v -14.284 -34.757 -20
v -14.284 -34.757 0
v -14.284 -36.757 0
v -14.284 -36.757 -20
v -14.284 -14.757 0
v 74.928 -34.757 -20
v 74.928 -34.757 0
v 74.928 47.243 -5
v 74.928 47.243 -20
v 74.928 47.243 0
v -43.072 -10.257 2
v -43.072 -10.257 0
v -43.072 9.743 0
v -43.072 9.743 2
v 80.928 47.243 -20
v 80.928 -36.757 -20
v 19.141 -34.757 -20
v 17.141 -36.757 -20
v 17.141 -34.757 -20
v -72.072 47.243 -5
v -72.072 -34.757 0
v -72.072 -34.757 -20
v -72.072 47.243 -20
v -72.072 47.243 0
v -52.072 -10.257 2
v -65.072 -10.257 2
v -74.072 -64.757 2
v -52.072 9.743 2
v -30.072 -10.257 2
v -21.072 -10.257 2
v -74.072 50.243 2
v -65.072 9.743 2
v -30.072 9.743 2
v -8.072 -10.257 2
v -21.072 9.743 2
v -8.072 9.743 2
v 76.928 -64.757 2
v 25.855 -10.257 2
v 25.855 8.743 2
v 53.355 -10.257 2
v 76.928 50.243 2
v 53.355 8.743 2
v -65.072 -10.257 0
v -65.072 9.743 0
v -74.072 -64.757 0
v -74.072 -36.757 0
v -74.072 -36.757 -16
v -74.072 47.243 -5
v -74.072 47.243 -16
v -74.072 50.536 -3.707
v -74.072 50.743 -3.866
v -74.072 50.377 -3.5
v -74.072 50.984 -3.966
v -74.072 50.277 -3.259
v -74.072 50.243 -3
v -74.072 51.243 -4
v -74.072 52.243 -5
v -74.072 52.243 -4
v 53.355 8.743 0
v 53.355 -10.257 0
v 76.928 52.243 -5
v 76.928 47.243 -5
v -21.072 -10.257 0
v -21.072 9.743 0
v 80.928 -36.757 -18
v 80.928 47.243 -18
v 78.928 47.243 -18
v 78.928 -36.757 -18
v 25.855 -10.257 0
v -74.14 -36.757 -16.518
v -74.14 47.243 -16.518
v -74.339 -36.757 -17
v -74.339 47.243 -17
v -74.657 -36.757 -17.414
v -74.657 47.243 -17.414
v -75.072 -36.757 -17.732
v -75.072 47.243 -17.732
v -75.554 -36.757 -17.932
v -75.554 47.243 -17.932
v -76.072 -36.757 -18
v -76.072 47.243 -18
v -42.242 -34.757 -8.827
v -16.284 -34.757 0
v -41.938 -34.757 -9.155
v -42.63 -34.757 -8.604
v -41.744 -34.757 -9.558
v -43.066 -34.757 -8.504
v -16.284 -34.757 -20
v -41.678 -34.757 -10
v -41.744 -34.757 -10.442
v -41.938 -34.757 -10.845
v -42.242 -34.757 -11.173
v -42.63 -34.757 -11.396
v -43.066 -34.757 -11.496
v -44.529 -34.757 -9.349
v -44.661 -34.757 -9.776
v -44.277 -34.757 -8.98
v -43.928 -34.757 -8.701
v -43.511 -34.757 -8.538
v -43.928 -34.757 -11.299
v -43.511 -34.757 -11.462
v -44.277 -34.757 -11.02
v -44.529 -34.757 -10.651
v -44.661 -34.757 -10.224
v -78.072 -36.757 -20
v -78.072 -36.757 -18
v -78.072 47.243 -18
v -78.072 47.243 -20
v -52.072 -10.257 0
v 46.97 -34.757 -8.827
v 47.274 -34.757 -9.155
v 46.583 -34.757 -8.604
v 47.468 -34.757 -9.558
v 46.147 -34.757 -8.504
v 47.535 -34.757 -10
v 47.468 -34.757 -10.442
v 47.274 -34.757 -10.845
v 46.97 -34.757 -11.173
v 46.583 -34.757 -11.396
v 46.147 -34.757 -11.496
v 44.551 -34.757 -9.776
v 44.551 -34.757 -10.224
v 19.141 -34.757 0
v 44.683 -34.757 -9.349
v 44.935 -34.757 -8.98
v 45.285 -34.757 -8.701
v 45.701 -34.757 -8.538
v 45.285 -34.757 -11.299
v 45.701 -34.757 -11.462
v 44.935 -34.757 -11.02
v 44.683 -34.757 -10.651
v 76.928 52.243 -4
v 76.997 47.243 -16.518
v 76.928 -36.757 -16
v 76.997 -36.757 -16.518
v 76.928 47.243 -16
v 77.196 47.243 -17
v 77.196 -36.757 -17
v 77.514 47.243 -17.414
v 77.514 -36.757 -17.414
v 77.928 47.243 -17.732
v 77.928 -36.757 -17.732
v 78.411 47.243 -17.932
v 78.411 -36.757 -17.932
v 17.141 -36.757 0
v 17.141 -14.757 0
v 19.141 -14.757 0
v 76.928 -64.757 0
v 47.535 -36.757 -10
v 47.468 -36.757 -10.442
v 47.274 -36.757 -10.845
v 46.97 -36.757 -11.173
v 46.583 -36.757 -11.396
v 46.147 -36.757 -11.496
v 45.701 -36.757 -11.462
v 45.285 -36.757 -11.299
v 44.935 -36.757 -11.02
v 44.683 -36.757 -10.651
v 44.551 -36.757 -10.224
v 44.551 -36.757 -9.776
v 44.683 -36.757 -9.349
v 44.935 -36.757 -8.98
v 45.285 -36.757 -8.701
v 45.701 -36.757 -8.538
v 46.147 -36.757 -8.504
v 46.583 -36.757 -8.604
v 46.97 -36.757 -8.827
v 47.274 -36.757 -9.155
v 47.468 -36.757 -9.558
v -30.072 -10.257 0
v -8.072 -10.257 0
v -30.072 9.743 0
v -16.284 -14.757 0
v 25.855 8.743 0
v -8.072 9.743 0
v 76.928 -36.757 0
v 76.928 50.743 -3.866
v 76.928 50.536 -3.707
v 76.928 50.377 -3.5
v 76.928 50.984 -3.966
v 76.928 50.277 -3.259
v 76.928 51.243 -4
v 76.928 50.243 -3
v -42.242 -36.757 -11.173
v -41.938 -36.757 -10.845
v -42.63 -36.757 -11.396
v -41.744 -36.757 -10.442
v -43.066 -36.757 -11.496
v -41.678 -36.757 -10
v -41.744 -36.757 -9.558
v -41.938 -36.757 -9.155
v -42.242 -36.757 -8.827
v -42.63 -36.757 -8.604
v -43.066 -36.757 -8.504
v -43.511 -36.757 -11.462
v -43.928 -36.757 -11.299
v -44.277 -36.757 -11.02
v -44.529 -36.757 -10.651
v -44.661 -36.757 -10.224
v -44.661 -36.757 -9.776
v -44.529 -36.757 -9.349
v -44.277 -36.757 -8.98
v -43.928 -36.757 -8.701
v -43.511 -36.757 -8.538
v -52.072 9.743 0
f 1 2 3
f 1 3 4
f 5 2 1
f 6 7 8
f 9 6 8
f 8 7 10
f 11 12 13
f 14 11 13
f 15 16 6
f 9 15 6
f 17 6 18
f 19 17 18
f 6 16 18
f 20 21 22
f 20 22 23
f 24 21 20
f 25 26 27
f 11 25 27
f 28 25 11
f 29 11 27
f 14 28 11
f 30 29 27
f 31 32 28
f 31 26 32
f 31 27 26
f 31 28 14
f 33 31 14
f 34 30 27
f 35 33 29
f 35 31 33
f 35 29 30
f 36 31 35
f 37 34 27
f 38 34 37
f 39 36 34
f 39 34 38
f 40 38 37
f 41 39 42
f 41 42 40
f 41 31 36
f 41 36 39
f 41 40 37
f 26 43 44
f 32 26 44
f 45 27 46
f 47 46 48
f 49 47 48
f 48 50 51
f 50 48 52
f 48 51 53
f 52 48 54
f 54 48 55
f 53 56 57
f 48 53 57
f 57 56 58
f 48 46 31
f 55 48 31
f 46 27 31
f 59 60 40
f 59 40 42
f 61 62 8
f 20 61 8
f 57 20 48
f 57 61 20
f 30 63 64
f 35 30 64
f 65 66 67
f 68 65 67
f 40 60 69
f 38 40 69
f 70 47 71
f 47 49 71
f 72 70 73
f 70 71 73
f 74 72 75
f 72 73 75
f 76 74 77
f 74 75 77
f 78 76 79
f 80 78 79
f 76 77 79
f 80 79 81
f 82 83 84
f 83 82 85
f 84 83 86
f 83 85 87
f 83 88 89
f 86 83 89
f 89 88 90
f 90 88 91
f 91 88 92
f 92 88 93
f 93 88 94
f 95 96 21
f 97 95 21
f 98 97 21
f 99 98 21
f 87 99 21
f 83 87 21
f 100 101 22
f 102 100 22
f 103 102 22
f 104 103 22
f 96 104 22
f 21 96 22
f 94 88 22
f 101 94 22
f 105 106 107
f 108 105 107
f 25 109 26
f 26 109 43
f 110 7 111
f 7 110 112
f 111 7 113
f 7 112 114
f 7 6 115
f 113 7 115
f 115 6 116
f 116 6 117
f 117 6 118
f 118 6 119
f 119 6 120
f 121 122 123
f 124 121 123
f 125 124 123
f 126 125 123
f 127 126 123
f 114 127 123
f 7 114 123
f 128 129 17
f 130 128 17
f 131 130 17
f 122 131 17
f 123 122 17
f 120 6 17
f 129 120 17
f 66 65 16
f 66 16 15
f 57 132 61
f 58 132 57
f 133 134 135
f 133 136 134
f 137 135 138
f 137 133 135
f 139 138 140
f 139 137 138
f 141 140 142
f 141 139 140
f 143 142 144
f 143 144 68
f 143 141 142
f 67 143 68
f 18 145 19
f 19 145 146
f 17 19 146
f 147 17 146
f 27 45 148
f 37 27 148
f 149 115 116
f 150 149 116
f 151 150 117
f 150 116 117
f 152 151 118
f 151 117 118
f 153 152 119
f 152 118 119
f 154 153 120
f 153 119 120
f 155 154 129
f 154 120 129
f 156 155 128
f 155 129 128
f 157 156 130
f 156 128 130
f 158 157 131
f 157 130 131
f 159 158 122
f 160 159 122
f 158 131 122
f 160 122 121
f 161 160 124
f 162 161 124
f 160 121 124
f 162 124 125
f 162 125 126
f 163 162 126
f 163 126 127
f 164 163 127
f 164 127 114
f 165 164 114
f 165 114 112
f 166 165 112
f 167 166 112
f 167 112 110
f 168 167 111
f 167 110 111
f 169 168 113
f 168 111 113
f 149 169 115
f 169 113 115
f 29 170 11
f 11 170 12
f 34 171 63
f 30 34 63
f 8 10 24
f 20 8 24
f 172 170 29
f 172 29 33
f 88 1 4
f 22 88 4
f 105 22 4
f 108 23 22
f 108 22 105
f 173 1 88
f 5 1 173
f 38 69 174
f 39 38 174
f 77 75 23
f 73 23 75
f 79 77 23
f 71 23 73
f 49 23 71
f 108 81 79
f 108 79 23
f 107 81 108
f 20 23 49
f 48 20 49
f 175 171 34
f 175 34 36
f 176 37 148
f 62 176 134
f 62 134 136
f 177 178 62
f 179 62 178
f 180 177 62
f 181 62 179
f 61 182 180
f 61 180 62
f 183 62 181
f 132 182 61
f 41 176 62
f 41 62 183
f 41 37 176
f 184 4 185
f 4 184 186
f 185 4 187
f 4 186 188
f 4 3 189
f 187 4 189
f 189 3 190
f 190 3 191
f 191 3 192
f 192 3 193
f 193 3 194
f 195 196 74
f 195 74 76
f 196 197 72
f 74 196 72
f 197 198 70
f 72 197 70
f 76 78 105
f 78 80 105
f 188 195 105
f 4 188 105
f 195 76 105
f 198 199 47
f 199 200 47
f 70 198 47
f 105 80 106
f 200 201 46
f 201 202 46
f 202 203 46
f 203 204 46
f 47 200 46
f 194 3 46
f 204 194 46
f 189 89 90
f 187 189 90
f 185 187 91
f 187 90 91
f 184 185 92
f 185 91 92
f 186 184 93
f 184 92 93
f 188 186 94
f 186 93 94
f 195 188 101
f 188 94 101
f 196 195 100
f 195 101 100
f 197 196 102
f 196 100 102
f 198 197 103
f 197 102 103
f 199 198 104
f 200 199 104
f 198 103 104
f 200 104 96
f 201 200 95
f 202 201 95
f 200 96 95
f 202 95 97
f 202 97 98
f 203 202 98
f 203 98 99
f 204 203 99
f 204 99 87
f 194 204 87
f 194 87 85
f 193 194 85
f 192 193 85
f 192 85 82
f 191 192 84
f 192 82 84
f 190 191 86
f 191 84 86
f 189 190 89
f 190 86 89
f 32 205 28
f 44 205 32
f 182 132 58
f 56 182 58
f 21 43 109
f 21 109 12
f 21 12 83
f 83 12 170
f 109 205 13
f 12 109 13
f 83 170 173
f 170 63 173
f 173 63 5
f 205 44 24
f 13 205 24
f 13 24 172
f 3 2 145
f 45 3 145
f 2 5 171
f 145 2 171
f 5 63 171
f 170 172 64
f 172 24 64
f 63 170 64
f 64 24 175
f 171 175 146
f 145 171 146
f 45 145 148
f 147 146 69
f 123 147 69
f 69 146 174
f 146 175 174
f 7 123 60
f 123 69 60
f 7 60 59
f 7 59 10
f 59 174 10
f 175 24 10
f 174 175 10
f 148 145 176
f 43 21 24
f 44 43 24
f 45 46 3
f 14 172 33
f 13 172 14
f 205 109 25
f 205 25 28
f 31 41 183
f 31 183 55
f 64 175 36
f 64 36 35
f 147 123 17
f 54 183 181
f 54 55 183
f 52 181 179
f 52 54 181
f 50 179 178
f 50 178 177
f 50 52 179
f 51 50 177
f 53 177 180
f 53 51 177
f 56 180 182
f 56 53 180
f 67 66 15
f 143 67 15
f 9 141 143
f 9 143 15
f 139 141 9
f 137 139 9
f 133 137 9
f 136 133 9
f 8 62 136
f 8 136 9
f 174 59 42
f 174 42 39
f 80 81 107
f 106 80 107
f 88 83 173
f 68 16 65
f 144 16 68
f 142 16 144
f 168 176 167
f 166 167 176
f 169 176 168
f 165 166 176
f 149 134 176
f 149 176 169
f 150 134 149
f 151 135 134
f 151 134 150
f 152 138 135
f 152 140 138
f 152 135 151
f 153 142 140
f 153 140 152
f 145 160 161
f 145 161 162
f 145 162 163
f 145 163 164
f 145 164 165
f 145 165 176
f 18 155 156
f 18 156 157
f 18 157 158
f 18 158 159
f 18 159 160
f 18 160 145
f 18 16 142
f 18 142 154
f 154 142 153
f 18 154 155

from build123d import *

# Parameters (mm, degrees)
SKETCH1_W            = 151
SKETCH1_H            = 115
BOSS_EXTRUDE1_DEPTH  = 2
SKETCH2_W            = 13
SKETCH2_H            = 20
CUT_EXTRUDE1_DEPTH   = 2
SKETCH3_W            = 27.5
SKETCH3_H            = 19
CUT_EXTRUDE2_DEPTH   = 2
SKETCH4_W            = 151
SKETCH4_H            = 3
BOSS_EXTRUDE2_DEPTH  = 4
SKETCH6_W            = 151
SKETCH6_H            = 5
BOSS_EXTRUDE3_DEPTH  = 1
FILLET1_R            = 1
SKETCH7_W            = 2
SKETCH7_H            = 84
BOSS_EXTRUDE4_DEPTH  = 10
SKETCH8_W            = 27.5
SKETCH8_H            = 19
SKETCH8_W_2          = 13
SKETCH8_H_2          = 20
CUT_EXTRUDE3_DEPTH   = 10
SKETCH9_W            = 126.512620881
SKETCH9_H            = 26.913833817
BOSS_EXTRUDE5_DEPTH  = 2
SKETCH10_W           = 2
SKETCH10_H           = 84
BOSS_EXTRUDE6_DEPTH  = 8
SKETCH12_W           = 6
SKETCH12_H           = 84
BOSS_EXTRUDE7_DEPTH  = 2
FILLET2_R            = 2
FILLET3_R            = 2
SKETCH14_W           = 57.787784132
SKETCH14_H           = 20
SKETCH14_W_2         = 59.787784131
BOSS_EXTRUDE8_DEPTH  = 2
SKETCH15_R           = 1.5
CUT_EXTRUDE4_DEPTH   = 2
BOSS_EXTRUDE9_DEPTH  = 2
BOSS_EXTRUDE10_DEPTH = 2


with BuildPart() as part:
    # Sketch1 → Boss-Extrude1 (new body)
    with BuildSketch(Plane.XY):
        with Locations((1.428458571, -7.256892256)):
            Rectangle(SKETCH1_W, SKETCH1_H)
    extrude(amount=BOSS_EXTRUDE1_DEPTH)

    # Sketch2 → Cut-Extrude1 (cut)
    with BuildSketch(Plane.XY.offset(2)):
        with Locations((-58.571541429, -29.756892256)):
            Rectangle(SKETCH2_W, SKETCH2_H)
        with Locations((-36.571541429, -29.756892256)):
            Rectangle(SKETCH2_W, SKETCH2_H)
        with Locations((-14.571541429, -29.756892256)):
            Rectangle(SKETCH2_W, SKETCH2_H)
    extrude(amount=-CUT_EXTRUDE1_DEPTH, mode=Mode.SUBTRACT)

    # Sketch3 → Cut-Extrude2 (cut)
    with BuildSketch(Plane.XY.offset(2)):
        with Locations((39.228458571, -29.756892256)):
            Rectangle(SKETCH3_W, SKETCH3_H)
    extrude(amount=-CUT_EXTRUDE2_DEPTH, mode=Mode.SUBTRACT)

    # Sketch4 → Boss-Extrude2 (add)
    with BuildSketch(Plane(origin=(0, 0, 0), x_dir=(-1, 0, 0), z_dir=(0, 0, -1))):
        with Locations((-1.428458571, 48.743107744)):
            Rectangle(SKETCH4_W, SKETCH4_H)
    extrude(amount=BOSS_EXTRUDE2_DEPTH)

    # Sketch6 → Boss-Extrude3 (add)
    with BuildSketch(Plane(origin=(0, 0, -4), x_dir=(-1, 0, 0), z_dir=(0, 0, -1))):
        with Locations((-1.428458571, 49.743107744)):
            Rectangle(SKETCH6_W, SKETCH6_H)
    extrude(amount=BOSS_EXTRUDE3_DEPTH)

    # Fillet1
    fillet1_edges = [part.edges().sort_by_distance(p)[0] for p in [
        (1.428458571, 50.243107744, -4),
    ]]
    fillet(fillet1_edges, radius=FILLET1_R)

    # Sketch7 → Boss-Extrude4 (add)
    with BuildSketch(Plane(origin=(0, 0, 0), x_dir=(-1, 0, 0), z_dir=(0, 0, -1))):
        with Locations((-75.928458571, 5.243107744)):
            Rectangle(SKETCH7_W, SKETCH7_H)
        with Locations((73.071541429, 5.243107744)):
            Rectangle(SKETCH7_W, SKETCH7_H)
    extrude(amount=BOSS_EXTRUDE4_DEPTH)

    # Sketch8 → Cut-Extrude3 (cut)
    with BuildSketch(Plane(origin=(0, 0, 0), x_dir=(-1, 0, 0), z_dir=(0, 0, -1))):
        with Locations((-39.604851179, -0.756892256)):
            Rectangle(SKETCH8_W, SKETCH8_H)
        with Locations((14.571541429, -0.256892256)):
            Rectangle(SKETCH8_W_2, SKETCH8_H_2)
        with Locations((36.571541429, -0.256892256)):
            Rectangle(SKETCH8_W_2, SKETCH8_H_2)
        with Locations((58.571541429, -0.256892256)):
            Rectangle(SKETCH8_W_2, SKETCH8_H_2)
    extrude(amount=-CUT_EXTRUDE3_DEPTH, mode=Mode.SUBTRACT)

    # Sketch9 → Boss-Extrude5 (add)
    with BuildSketch(Plane(origin=(0, 0, 0), x_dir=(-1, 0, 0), z_dir=(0, 0, -1))):
        with Locations((5.18783125, -30.15024479)):
            Rectangle(SKETCH9_W, SKETCH9_H)
    extrude(amount=-BOSS_EXTRUDE5_DEPTH)

    # Sketch10 → Boss-Extrude6 (add)
    with BuildSketch(Plane(origin=(0, 0, -10), x_dir=(-1, 0, 0), z_dir=(0, 0, -1))):
        with Locations((-75.928458571, 5.243107744)):
            Rectangle(SKETCH10_W, SKETCH10_H)
        with Locations((73.071541429, 5.243107744)):
            Rectangle(SKETCH10_W, SKETCH10_H)
    extrude(amount=BOSS_EXTRUDE6_DEPTH)

    # Sketch12 → Boss-Extrude7 (add)
    with BuildSketch(Plane(origin=(0, 0, -18), x_dir=(-1, 0, 0), z_dir=(0, 0, -1))):
        with Locations((-77.928458571, 5.243107744)):
            Rectangle(SKETCH12_W, SKETCH12_H)
        with Locations((75.071541429, 5.243107744)):
            Rectangle(SKETCH12_W, SKETCH12_H)
    extrude(amount=BOSS_EXTRUDE7_DEPTH)

    # Fillet2
    fillet2_edges = [part.edges().sort_by_distance(p)[0] for p in [
        (76.928458571, 5.243107744, -18),
    ]]
    fillet(fillet2_edges, radius=FILLET2_R)

    # Fillet3
    fillet3_edges = [part.edges().sort_by_distance(p)[0] for p in [
        (-74.071541429, 5.243107744, -18),
    ]]
    fillet(fillet3_edges, radius=FILLET3_R)

    # Sketch14 → Boss-Extrude8 (add)
    with BuildSketch(Plane(origin=(0, -36.756892256, 0), x_dir=(-1, 0, 0), z_dir=(0, -1, 0))):
        with Locations((-46.034566505, 10)):
            Rectangle(SKETCH14_W, SKETCH14_H)
        with Locations((44.177649364, 10)):
            Rectangle(SKETCH14_W_2, SKETCH14_H)
    extrude(amount=-BOSS_EXTRUDE8_DEPTH)

    # Sketch15 → Cut-Extrude4 (cut)
    with BuildSketch(Plane(origin=(0, -34.756892256, 0), x_dir=(1, 0, 0), z_dir=(0, 1, 0))):
        with Locations((46.034566505, 10)):
            Circle(SKETCH15_R)
        with Locations((-43.177649364, 10)):
            Circle(SKETCH15_R)
    extrude(amount=-CUT_EXTRUDE4_DEPTH, mode=Mode.SUBTRACT)

    # Sketch16 → Boss-Extrude9 (add)
    with BuildSketch(Plane.ZY.offset(-17.140674439)):
        Polygon((0, -34.756892256), (-20, -34.756892256), (0, -14.756892256), align=None)
    extrude(amount=-BOSS_EXTRUDE9_DEPTH)

    # Sketch18 → Boss-Extrude10 (add)
    with BuildSketch(Plane(origin=(-14.283757298, 0, 0), x_dir=(0, 0, -1), z_dir=(1, 0, 0))):
        Polygon((0, -34.756892256), (20, -34.756892256), (0, -14.756892256), align=None)
    extrude(amount=-BOSS_EXTRUDE10_DEPTH)


solid = part.part
